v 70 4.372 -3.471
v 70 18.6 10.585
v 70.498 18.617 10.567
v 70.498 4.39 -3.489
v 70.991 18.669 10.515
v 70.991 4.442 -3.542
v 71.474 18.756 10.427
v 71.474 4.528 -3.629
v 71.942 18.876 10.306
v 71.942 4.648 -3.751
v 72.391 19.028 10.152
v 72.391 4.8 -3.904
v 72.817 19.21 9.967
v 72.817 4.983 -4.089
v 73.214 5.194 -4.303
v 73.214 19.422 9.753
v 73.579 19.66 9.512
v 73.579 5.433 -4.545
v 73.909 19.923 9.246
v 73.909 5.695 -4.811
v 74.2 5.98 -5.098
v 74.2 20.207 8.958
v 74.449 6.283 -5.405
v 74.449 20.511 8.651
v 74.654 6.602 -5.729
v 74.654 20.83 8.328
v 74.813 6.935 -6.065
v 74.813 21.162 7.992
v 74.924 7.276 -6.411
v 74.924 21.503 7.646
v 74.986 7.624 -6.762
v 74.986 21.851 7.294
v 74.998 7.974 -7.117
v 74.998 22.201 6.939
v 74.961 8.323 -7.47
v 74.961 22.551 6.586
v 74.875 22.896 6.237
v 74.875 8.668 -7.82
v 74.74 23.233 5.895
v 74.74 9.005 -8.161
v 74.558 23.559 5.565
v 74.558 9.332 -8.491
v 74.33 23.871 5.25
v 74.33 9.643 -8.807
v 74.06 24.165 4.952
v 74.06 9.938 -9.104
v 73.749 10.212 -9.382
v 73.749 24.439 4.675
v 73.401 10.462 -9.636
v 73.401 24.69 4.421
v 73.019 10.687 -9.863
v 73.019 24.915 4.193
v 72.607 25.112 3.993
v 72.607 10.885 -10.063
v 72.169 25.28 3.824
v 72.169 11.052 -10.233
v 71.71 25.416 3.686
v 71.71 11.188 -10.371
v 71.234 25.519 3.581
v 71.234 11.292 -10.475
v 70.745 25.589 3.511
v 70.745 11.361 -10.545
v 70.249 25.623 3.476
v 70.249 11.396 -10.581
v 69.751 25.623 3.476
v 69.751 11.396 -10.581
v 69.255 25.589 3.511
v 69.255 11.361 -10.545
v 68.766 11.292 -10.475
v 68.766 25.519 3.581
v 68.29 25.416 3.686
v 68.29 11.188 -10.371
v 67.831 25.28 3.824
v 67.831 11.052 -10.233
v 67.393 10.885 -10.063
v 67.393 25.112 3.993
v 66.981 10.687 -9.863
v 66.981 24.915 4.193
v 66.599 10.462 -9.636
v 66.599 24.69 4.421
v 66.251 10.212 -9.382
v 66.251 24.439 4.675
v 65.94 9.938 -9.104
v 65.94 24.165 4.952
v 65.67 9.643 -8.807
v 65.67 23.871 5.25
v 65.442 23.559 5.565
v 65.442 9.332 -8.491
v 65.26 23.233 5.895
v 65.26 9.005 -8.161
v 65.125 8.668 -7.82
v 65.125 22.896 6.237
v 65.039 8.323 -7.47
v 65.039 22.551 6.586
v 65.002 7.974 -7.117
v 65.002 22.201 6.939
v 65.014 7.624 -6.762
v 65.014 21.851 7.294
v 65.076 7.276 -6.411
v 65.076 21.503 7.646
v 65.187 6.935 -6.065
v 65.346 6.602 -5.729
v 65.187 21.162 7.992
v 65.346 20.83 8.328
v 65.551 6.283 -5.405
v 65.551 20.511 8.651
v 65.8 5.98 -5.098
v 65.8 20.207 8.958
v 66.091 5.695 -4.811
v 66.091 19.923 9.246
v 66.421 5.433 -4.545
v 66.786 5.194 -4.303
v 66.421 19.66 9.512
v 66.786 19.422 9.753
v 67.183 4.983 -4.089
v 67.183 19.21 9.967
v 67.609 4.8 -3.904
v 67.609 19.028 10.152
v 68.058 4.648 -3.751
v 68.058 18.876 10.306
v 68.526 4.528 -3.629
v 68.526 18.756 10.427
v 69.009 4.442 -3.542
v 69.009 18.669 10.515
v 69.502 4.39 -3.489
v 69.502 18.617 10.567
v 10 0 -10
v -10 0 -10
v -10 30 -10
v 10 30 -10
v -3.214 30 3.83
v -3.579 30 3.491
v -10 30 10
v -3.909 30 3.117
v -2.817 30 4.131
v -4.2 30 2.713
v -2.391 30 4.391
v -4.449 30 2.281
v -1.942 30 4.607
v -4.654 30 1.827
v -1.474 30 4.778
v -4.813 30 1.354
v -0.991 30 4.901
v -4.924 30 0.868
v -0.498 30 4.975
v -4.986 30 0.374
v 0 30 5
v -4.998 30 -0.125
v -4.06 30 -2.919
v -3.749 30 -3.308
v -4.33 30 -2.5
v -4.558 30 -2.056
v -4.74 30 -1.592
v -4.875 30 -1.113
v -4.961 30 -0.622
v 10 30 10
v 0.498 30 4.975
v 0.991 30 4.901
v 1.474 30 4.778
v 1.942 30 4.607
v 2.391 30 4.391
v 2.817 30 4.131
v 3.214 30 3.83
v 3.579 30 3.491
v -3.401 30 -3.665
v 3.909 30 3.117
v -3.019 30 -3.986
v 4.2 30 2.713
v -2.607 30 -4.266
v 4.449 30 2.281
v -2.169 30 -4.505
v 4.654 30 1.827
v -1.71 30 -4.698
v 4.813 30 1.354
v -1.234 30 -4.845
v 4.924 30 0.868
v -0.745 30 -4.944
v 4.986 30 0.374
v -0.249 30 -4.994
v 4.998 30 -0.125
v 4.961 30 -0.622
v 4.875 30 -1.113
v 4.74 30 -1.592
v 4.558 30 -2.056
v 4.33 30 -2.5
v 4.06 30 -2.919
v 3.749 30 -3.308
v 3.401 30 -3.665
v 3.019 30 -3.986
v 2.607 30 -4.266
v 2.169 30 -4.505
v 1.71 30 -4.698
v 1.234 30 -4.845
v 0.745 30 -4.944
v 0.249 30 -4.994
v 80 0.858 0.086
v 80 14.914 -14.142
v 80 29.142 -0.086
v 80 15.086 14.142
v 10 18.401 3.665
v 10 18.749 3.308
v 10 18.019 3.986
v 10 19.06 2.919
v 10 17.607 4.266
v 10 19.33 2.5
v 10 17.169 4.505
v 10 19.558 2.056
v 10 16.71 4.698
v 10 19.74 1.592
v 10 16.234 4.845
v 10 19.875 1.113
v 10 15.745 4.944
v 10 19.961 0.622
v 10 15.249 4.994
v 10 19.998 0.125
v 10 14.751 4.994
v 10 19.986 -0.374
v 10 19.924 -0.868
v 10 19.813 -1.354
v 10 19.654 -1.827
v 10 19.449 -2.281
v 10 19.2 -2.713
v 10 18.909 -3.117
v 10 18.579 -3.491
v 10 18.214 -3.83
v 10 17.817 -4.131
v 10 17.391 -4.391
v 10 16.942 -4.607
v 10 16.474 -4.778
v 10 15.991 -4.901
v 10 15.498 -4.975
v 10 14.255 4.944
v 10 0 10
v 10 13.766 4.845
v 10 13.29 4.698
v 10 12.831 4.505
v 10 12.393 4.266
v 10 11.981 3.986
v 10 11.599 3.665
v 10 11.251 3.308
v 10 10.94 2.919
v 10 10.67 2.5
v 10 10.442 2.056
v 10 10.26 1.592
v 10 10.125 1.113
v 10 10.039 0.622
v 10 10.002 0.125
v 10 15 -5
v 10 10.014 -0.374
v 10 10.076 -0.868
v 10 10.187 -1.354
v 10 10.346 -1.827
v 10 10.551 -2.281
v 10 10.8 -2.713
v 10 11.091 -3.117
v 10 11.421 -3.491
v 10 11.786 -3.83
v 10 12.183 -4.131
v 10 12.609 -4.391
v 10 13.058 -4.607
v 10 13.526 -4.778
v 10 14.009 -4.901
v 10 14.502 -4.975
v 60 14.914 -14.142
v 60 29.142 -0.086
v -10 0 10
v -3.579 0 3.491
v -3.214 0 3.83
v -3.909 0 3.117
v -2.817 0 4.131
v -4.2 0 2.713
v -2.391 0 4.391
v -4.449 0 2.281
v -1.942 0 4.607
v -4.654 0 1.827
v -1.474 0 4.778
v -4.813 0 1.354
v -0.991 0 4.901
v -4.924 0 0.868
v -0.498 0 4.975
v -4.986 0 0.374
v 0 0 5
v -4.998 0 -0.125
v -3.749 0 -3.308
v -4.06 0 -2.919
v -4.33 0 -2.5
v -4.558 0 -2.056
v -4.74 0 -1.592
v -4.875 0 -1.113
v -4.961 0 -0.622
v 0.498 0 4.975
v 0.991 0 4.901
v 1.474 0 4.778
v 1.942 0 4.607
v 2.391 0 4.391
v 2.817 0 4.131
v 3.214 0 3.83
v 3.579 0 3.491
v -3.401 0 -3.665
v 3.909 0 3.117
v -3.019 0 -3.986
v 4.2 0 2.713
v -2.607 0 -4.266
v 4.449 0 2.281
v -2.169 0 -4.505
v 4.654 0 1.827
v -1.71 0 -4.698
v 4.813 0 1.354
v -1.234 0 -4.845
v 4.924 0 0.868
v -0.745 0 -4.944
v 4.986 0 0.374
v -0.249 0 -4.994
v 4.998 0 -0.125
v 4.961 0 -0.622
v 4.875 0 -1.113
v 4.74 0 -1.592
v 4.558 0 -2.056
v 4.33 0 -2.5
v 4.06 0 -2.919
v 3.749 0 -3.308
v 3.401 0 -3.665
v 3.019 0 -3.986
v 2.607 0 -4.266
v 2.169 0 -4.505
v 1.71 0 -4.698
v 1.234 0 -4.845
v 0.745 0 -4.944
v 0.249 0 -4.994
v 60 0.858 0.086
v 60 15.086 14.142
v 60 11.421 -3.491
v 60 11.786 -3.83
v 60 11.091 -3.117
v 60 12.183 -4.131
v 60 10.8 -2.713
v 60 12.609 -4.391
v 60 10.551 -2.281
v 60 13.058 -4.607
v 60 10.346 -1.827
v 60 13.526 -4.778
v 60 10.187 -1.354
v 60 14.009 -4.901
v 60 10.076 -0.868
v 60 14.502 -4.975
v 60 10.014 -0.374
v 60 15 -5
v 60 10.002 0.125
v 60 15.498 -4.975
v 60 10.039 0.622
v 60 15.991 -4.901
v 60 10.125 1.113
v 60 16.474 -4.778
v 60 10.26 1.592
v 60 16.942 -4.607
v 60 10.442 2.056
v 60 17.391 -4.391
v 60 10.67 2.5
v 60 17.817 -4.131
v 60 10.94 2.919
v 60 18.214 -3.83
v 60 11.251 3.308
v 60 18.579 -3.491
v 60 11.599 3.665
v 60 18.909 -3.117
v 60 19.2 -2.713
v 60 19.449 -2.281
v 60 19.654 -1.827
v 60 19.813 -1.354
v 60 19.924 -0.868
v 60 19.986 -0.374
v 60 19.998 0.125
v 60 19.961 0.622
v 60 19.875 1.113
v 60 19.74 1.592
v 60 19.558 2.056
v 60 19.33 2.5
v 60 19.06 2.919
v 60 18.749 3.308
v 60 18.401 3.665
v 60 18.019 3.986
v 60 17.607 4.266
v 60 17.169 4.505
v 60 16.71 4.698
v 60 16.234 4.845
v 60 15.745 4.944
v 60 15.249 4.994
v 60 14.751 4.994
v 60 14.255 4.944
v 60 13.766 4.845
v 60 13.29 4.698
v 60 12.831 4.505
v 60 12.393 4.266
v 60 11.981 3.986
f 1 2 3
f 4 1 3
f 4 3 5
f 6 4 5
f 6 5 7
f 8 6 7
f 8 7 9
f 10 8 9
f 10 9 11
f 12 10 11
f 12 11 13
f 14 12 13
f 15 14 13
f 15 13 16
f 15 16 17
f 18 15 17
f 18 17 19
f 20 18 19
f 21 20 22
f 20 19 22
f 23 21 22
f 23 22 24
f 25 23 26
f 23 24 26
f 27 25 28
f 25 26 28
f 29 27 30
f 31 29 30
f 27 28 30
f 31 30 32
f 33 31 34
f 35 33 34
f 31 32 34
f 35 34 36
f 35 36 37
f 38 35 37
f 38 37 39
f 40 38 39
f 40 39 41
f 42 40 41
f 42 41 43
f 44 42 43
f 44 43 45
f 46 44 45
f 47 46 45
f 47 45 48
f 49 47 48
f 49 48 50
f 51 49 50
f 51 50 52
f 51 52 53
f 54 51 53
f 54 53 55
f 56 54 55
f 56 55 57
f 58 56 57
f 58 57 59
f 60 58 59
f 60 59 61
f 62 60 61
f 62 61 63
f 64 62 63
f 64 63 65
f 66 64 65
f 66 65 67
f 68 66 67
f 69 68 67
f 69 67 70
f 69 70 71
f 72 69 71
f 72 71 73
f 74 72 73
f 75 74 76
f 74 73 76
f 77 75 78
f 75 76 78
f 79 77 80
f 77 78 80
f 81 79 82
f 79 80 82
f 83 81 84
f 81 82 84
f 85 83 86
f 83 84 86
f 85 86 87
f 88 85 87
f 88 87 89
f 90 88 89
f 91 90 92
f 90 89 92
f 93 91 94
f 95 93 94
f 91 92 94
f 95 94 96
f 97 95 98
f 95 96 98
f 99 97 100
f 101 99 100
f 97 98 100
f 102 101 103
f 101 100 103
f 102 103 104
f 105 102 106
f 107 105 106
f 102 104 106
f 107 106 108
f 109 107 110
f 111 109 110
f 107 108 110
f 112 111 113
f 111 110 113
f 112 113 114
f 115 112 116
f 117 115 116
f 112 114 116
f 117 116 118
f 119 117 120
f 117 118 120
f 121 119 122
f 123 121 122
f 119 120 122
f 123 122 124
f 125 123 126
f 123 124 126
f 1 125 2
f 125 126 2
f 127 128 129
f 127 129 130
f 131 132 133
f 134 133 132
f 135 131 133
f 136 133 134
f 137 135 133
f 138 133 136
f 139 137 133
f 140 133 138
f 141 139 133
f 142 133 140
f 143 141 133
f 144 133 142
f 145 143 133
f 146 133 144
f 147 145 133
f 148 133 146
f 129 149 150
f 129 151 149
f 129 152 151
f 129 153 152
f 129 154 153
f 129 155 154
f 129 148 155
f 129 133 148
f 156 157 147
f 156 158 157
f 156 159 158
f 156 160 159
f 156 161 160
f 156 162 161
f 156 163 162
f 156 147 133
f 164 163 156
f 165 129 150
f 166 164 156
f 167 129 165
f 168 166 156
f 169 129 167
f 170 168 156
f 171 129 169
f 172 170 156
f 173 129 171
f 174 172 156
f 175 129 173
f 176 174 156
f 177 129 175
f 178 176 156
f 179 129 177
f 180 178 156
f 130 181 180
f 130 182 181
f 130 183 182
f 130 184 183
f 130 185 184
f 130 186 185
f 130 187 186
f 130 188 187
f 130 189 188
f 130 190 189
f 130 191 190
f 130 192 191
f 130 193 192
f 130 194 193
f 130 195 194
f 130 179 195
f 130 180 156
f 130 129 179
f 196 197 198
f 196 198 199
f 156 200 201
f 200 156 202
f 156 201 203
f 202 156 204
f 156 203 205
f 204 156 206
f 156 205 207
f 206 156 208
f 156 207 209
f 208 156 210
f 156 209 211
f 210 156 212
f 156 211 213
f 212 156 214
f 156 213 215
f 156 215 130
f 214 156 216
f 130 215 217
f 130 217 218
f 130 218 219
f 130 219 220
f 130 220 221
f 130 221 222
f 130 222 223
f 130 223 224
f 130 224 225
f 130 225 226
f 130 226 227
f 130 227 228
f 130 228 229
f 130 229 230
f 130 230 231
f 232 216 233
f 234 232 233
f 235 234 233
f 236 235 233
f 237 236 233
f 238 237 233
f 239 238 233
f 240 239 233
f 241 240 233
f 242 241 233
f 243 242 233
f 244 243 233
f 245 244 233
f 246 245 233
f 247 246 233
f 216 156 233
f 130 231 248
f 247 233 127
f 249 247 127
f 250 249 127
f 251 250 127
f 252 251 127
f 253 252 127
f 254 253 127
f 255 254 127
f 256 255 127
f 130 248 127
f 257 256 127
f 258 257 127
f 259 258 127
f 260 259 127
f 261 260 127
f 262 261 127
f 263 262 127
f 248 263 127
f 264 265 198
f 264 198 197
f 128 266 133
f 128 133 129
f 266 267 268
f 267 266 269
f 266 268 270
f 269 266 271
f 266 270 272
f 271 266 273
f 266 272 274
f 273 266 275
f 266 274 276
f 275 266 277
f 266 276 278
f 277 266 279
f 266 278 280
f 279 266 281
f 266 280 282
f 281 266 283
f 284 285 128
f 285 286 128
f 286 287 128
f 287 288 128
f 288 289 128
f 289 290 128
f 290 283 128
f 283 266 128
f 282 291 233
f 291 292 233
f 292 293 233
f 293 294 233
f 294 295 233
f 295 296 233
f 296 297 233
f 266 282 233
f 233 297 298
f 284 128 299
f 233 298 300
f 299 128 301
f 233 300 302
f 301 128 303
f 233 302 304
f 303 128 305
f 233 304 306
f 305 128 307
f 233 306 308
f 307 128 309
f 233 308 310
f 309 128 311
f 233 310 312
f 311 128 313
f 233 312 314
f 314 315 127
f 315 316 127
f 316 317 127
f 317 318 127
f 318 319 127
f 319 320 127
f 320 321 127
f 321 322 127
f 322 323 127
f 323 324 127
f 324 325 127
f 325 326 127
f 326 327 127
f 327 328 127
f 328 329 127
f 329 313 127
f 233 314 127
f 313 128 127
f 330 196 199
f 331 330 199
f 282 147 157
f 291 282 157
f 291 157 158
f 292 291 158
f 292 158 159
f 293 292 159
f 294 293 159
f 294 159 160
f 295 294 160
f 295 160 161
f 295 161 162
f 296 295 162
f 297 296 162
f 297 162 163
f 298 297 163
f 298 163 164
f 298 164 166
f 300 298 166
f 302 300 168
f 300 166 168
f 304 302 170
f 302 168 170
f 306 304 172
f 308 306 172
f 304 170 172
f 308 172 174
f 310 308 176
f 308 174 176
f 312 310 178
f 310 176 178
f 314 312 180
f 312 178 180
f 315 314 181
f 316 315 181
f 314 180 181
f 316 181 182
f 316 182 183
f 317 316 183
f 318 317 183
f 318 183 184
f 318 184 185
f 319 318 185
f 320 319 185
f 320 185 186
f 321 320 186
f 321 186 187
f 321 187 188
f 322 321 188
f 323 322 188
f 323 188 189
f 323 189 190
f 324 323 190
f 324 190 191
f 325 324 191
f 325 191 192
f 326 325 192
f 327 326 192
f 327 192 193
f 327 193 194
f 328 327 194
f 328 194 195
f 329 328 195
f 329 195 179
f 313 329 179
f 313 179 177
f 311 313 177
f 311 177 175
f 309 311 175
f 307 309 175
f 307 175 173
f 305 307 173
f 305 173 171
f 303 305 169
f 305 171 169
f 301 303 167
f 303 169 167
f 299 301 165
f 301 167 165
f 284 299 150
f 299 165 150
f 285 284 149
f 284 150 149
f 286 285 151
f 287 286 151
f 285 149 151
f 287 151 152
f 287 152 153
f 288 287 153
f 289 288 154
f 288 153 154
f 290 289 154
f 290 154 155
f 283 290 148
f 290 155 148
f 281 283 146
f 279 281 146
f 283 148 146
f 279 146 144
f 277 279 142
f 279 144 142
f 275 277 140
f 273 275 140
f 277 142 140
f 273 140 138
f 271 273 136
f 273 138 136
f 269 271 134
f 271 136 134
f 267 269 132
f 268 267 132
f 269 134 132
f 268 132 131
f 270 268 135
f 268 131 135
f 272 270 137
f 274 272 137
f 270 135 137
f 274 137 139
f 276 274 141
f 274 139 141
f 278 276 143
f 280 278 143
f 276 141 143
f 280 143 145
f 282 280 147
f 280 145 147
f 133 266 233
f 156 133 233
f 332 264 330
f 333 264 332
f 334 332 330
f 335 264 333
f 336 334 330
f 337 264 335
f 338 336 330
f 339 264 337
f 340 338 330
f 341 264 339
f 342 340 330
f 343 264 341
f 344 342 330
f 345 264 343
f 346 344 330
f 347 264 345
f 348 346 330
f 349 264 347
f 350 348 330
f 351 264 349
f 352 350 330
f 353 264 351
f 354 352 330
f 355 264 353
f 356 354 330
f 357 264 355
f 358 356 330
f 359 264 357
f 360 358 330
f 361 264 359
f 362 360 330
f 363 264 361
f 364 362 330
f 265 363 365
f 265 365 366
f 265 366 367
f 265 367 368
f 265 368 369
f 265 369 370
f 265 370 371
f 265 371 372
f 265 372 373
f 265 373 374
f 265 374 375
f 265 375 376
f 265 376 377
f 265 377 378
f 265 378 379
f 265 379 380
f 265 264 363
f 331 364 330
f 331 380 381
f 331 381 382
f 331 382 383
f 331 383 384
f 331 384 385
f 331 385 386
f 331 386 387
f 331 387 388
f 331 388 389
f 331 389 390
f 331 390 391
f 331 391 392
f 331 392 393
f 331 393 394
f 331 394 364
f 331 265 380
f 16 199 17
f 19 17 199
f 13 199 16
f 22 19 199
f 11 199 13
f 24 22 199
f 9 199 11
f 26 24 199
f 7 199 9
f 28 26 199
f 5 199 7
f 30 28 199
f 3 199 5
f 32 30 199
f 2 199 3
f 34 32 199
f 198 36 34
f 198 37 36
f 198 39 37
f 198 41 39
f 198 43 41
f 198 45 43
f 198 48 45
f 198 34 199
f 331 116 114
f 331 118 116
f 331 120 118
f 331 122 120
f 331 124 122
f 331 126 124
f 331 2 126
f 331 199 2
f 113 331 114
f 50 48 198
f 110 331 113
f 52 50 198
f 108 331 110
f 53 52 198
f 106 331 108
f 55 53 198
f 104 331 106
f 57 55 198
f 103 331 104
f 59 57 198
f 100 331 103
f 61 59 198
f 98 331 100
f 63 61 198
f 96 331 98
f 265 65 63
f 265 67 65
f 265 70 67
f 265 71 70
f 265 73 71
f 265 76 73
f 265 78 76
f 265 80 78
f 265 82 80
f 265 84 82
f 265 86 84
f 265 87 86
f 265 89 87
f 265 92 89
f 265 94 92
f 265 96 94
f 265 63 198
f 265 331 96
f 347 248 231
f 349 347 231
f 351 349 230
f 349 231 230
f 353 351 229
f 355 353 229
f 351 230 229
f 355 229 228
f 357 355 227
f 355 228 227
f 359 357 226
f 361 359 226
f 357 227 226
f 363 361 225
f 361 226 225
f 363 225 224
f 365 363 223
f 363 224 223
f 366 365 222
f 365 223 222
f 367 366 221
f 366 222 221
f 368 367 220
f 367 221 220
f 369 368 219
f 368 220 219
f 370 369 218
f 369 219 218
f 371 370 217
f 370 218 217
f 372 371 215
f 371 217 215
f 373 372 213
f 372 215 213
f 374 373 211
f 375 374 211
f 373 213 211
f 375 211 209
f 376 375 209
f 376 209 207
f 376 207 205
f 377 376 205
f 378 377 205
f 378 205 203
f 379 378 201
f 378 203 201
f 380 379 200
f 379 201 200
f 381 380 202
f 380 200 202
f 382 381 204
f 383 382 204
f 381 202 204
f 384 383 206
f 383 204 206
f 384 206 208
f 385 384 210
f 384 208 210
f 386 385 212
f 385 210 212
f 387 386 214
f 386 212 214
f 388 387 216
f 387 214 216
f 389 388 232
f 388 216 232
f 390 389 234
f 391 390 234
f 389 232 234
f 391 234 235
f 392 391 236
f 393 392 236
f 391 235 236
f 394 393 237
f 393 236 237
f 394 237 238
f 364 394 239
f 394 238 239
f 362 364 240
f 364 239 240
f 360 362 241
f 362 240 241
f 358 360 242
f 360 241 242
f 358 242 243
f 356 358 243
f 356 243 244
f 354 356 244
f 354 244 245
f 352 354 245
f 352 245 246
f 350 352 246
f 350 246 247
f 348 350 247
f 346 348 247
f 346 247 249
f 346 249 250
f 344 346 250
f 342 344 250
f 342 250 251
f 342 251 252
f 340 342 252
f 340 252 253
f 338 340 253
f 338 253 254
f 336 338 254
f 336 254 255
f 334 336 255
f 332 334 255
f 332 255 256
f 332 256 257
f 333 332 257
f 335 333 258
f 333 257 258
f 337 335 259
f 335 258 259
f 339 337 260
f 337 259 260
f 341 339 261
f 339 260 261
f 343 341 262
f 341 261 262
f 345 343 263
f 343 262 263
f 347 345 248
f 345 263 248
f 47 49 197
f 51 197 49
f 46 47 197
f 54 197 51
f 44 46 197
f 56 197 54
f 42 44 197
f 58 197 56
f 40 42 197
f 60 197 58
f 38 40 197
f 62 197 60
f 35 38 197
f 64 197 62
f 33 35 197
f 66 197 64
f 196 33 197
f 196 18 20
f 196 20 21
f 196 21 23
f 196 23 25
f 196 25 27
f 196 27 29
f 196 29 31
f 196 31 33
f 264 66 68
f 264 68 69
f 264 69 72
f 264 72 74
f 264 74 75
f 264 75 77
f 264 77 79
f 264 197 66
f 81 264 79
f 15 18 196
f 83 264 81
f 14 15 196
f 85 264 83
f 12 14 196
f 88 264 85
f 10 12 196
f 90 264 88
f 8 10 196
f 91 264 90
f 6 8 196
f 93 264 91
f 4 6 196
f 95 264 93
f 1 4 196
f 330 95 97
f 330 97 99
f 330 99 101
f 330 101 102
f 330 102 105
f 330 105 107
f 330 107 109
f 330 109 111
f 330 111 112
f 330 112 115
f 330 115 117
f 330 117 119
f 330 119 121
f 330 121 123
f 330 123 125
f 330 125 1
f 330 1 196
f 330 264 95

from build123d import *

# Parameters (mm, degrees)
SKETCH_1_W          = 20
SKETCH_1_H          = 20
EXTRUDE_1_DEPTH     = 30
SKETCH_2_R          = 5
EXTRUDE_2_DEPTH     = 50
EXTRUDE_3_DEPTH     = 20
CUT_EXTRUDE_1_REACH = 88.602
SKETCH_4_R          = 5
CUT_EXTRUDE_2_REACH = 88.348
SKETCH_5_R          = 5


with BuildPart() as part:
    # 草图1 → 凸台-拉伸1 (new body)
    with BuildSketch(Plane(origin=(0, 0, 0), x_dir=(1, 0, 0), z_dir=(0, 1, 0))):
        Rectangle(SKETCH_1_W, SKETCH_1_H)
    extrude(amount=EXTRUDE_1_DEPTH)

    # 草图2 → 凸台-拉伸2 (add)
    with BuildSketch(Plane(origin=(10, 0, 0), x_dir=(0, 0, -1), z_dir=(1, 0, 0))):
        with Locations((0, 15)):
            Circle(SKETCH_2_R)
    extrude(amount=EXTRUDE_2_DEPTH)

    # 草图3 → 凸台-拉伸3 (add)
    with BuildSketch(Plane(origin=(60, 0, 0), x_dir=(0, 0, -1), z_dir=(1, 0, 0))):
        Polygon((-14.14187695, 15.085535546), (0.085535546, 29.14187695), (14.14187695, 14.914464454), (-0.085535546, 0.85812305), align=None)
    extrude(amount=EXTRUDE_3_DEPTH)

    # 草图4 → 切除-拉伸1 (cut, up to next)
    with BuildSketch(Plane(origin=(0, 30, 0), x_dir=(1, 0, 0), z_dir=(0, 1, 0)), mode=Mode.PRIVATE) as cut_extrude_1_sk1:
        Circle(SKETCH_4_R)
    cut_extrude_1_tool1 = extrude(cut_extrude_1_sk1.sketch, amount=-CUT_EXTRUDE_1_REACH, mode=Mode.PRIVATE) & part.part
    add(cut_extrude_1_tool1.solids().sort_by_distance((0, 30, 0))[0], mode=Mode.SUBTRACT)

    # 草图5 → 切除-拉伸2 (cut, up to next)
    with BuildSketch(Plane(origin=(0, 14.704428736, 14.527621977), x_dir=(1, 0, 0), z_dir=(0, 0.7113706248059255, 0.7028170701990862)), mode=Mode.PRIVATE) as cut_extrude_2_sk1:
        with Locations((70, 10.542256053)):
            Circle(SKETCH_5_R)
    cut_extrude_2_tool1 = extrude(cut_extrude_2_sk1.sketch, amount=-CUT_EXTRUDE_2_REACH, mode=Mode.PRIVATE) & part.part
    add(cut_extrude_2_tool1.solids().sort_by_distance((70, 22.113706, 7.028171))[0], mode=Mode.SUBTRACT)


solid = part.part
